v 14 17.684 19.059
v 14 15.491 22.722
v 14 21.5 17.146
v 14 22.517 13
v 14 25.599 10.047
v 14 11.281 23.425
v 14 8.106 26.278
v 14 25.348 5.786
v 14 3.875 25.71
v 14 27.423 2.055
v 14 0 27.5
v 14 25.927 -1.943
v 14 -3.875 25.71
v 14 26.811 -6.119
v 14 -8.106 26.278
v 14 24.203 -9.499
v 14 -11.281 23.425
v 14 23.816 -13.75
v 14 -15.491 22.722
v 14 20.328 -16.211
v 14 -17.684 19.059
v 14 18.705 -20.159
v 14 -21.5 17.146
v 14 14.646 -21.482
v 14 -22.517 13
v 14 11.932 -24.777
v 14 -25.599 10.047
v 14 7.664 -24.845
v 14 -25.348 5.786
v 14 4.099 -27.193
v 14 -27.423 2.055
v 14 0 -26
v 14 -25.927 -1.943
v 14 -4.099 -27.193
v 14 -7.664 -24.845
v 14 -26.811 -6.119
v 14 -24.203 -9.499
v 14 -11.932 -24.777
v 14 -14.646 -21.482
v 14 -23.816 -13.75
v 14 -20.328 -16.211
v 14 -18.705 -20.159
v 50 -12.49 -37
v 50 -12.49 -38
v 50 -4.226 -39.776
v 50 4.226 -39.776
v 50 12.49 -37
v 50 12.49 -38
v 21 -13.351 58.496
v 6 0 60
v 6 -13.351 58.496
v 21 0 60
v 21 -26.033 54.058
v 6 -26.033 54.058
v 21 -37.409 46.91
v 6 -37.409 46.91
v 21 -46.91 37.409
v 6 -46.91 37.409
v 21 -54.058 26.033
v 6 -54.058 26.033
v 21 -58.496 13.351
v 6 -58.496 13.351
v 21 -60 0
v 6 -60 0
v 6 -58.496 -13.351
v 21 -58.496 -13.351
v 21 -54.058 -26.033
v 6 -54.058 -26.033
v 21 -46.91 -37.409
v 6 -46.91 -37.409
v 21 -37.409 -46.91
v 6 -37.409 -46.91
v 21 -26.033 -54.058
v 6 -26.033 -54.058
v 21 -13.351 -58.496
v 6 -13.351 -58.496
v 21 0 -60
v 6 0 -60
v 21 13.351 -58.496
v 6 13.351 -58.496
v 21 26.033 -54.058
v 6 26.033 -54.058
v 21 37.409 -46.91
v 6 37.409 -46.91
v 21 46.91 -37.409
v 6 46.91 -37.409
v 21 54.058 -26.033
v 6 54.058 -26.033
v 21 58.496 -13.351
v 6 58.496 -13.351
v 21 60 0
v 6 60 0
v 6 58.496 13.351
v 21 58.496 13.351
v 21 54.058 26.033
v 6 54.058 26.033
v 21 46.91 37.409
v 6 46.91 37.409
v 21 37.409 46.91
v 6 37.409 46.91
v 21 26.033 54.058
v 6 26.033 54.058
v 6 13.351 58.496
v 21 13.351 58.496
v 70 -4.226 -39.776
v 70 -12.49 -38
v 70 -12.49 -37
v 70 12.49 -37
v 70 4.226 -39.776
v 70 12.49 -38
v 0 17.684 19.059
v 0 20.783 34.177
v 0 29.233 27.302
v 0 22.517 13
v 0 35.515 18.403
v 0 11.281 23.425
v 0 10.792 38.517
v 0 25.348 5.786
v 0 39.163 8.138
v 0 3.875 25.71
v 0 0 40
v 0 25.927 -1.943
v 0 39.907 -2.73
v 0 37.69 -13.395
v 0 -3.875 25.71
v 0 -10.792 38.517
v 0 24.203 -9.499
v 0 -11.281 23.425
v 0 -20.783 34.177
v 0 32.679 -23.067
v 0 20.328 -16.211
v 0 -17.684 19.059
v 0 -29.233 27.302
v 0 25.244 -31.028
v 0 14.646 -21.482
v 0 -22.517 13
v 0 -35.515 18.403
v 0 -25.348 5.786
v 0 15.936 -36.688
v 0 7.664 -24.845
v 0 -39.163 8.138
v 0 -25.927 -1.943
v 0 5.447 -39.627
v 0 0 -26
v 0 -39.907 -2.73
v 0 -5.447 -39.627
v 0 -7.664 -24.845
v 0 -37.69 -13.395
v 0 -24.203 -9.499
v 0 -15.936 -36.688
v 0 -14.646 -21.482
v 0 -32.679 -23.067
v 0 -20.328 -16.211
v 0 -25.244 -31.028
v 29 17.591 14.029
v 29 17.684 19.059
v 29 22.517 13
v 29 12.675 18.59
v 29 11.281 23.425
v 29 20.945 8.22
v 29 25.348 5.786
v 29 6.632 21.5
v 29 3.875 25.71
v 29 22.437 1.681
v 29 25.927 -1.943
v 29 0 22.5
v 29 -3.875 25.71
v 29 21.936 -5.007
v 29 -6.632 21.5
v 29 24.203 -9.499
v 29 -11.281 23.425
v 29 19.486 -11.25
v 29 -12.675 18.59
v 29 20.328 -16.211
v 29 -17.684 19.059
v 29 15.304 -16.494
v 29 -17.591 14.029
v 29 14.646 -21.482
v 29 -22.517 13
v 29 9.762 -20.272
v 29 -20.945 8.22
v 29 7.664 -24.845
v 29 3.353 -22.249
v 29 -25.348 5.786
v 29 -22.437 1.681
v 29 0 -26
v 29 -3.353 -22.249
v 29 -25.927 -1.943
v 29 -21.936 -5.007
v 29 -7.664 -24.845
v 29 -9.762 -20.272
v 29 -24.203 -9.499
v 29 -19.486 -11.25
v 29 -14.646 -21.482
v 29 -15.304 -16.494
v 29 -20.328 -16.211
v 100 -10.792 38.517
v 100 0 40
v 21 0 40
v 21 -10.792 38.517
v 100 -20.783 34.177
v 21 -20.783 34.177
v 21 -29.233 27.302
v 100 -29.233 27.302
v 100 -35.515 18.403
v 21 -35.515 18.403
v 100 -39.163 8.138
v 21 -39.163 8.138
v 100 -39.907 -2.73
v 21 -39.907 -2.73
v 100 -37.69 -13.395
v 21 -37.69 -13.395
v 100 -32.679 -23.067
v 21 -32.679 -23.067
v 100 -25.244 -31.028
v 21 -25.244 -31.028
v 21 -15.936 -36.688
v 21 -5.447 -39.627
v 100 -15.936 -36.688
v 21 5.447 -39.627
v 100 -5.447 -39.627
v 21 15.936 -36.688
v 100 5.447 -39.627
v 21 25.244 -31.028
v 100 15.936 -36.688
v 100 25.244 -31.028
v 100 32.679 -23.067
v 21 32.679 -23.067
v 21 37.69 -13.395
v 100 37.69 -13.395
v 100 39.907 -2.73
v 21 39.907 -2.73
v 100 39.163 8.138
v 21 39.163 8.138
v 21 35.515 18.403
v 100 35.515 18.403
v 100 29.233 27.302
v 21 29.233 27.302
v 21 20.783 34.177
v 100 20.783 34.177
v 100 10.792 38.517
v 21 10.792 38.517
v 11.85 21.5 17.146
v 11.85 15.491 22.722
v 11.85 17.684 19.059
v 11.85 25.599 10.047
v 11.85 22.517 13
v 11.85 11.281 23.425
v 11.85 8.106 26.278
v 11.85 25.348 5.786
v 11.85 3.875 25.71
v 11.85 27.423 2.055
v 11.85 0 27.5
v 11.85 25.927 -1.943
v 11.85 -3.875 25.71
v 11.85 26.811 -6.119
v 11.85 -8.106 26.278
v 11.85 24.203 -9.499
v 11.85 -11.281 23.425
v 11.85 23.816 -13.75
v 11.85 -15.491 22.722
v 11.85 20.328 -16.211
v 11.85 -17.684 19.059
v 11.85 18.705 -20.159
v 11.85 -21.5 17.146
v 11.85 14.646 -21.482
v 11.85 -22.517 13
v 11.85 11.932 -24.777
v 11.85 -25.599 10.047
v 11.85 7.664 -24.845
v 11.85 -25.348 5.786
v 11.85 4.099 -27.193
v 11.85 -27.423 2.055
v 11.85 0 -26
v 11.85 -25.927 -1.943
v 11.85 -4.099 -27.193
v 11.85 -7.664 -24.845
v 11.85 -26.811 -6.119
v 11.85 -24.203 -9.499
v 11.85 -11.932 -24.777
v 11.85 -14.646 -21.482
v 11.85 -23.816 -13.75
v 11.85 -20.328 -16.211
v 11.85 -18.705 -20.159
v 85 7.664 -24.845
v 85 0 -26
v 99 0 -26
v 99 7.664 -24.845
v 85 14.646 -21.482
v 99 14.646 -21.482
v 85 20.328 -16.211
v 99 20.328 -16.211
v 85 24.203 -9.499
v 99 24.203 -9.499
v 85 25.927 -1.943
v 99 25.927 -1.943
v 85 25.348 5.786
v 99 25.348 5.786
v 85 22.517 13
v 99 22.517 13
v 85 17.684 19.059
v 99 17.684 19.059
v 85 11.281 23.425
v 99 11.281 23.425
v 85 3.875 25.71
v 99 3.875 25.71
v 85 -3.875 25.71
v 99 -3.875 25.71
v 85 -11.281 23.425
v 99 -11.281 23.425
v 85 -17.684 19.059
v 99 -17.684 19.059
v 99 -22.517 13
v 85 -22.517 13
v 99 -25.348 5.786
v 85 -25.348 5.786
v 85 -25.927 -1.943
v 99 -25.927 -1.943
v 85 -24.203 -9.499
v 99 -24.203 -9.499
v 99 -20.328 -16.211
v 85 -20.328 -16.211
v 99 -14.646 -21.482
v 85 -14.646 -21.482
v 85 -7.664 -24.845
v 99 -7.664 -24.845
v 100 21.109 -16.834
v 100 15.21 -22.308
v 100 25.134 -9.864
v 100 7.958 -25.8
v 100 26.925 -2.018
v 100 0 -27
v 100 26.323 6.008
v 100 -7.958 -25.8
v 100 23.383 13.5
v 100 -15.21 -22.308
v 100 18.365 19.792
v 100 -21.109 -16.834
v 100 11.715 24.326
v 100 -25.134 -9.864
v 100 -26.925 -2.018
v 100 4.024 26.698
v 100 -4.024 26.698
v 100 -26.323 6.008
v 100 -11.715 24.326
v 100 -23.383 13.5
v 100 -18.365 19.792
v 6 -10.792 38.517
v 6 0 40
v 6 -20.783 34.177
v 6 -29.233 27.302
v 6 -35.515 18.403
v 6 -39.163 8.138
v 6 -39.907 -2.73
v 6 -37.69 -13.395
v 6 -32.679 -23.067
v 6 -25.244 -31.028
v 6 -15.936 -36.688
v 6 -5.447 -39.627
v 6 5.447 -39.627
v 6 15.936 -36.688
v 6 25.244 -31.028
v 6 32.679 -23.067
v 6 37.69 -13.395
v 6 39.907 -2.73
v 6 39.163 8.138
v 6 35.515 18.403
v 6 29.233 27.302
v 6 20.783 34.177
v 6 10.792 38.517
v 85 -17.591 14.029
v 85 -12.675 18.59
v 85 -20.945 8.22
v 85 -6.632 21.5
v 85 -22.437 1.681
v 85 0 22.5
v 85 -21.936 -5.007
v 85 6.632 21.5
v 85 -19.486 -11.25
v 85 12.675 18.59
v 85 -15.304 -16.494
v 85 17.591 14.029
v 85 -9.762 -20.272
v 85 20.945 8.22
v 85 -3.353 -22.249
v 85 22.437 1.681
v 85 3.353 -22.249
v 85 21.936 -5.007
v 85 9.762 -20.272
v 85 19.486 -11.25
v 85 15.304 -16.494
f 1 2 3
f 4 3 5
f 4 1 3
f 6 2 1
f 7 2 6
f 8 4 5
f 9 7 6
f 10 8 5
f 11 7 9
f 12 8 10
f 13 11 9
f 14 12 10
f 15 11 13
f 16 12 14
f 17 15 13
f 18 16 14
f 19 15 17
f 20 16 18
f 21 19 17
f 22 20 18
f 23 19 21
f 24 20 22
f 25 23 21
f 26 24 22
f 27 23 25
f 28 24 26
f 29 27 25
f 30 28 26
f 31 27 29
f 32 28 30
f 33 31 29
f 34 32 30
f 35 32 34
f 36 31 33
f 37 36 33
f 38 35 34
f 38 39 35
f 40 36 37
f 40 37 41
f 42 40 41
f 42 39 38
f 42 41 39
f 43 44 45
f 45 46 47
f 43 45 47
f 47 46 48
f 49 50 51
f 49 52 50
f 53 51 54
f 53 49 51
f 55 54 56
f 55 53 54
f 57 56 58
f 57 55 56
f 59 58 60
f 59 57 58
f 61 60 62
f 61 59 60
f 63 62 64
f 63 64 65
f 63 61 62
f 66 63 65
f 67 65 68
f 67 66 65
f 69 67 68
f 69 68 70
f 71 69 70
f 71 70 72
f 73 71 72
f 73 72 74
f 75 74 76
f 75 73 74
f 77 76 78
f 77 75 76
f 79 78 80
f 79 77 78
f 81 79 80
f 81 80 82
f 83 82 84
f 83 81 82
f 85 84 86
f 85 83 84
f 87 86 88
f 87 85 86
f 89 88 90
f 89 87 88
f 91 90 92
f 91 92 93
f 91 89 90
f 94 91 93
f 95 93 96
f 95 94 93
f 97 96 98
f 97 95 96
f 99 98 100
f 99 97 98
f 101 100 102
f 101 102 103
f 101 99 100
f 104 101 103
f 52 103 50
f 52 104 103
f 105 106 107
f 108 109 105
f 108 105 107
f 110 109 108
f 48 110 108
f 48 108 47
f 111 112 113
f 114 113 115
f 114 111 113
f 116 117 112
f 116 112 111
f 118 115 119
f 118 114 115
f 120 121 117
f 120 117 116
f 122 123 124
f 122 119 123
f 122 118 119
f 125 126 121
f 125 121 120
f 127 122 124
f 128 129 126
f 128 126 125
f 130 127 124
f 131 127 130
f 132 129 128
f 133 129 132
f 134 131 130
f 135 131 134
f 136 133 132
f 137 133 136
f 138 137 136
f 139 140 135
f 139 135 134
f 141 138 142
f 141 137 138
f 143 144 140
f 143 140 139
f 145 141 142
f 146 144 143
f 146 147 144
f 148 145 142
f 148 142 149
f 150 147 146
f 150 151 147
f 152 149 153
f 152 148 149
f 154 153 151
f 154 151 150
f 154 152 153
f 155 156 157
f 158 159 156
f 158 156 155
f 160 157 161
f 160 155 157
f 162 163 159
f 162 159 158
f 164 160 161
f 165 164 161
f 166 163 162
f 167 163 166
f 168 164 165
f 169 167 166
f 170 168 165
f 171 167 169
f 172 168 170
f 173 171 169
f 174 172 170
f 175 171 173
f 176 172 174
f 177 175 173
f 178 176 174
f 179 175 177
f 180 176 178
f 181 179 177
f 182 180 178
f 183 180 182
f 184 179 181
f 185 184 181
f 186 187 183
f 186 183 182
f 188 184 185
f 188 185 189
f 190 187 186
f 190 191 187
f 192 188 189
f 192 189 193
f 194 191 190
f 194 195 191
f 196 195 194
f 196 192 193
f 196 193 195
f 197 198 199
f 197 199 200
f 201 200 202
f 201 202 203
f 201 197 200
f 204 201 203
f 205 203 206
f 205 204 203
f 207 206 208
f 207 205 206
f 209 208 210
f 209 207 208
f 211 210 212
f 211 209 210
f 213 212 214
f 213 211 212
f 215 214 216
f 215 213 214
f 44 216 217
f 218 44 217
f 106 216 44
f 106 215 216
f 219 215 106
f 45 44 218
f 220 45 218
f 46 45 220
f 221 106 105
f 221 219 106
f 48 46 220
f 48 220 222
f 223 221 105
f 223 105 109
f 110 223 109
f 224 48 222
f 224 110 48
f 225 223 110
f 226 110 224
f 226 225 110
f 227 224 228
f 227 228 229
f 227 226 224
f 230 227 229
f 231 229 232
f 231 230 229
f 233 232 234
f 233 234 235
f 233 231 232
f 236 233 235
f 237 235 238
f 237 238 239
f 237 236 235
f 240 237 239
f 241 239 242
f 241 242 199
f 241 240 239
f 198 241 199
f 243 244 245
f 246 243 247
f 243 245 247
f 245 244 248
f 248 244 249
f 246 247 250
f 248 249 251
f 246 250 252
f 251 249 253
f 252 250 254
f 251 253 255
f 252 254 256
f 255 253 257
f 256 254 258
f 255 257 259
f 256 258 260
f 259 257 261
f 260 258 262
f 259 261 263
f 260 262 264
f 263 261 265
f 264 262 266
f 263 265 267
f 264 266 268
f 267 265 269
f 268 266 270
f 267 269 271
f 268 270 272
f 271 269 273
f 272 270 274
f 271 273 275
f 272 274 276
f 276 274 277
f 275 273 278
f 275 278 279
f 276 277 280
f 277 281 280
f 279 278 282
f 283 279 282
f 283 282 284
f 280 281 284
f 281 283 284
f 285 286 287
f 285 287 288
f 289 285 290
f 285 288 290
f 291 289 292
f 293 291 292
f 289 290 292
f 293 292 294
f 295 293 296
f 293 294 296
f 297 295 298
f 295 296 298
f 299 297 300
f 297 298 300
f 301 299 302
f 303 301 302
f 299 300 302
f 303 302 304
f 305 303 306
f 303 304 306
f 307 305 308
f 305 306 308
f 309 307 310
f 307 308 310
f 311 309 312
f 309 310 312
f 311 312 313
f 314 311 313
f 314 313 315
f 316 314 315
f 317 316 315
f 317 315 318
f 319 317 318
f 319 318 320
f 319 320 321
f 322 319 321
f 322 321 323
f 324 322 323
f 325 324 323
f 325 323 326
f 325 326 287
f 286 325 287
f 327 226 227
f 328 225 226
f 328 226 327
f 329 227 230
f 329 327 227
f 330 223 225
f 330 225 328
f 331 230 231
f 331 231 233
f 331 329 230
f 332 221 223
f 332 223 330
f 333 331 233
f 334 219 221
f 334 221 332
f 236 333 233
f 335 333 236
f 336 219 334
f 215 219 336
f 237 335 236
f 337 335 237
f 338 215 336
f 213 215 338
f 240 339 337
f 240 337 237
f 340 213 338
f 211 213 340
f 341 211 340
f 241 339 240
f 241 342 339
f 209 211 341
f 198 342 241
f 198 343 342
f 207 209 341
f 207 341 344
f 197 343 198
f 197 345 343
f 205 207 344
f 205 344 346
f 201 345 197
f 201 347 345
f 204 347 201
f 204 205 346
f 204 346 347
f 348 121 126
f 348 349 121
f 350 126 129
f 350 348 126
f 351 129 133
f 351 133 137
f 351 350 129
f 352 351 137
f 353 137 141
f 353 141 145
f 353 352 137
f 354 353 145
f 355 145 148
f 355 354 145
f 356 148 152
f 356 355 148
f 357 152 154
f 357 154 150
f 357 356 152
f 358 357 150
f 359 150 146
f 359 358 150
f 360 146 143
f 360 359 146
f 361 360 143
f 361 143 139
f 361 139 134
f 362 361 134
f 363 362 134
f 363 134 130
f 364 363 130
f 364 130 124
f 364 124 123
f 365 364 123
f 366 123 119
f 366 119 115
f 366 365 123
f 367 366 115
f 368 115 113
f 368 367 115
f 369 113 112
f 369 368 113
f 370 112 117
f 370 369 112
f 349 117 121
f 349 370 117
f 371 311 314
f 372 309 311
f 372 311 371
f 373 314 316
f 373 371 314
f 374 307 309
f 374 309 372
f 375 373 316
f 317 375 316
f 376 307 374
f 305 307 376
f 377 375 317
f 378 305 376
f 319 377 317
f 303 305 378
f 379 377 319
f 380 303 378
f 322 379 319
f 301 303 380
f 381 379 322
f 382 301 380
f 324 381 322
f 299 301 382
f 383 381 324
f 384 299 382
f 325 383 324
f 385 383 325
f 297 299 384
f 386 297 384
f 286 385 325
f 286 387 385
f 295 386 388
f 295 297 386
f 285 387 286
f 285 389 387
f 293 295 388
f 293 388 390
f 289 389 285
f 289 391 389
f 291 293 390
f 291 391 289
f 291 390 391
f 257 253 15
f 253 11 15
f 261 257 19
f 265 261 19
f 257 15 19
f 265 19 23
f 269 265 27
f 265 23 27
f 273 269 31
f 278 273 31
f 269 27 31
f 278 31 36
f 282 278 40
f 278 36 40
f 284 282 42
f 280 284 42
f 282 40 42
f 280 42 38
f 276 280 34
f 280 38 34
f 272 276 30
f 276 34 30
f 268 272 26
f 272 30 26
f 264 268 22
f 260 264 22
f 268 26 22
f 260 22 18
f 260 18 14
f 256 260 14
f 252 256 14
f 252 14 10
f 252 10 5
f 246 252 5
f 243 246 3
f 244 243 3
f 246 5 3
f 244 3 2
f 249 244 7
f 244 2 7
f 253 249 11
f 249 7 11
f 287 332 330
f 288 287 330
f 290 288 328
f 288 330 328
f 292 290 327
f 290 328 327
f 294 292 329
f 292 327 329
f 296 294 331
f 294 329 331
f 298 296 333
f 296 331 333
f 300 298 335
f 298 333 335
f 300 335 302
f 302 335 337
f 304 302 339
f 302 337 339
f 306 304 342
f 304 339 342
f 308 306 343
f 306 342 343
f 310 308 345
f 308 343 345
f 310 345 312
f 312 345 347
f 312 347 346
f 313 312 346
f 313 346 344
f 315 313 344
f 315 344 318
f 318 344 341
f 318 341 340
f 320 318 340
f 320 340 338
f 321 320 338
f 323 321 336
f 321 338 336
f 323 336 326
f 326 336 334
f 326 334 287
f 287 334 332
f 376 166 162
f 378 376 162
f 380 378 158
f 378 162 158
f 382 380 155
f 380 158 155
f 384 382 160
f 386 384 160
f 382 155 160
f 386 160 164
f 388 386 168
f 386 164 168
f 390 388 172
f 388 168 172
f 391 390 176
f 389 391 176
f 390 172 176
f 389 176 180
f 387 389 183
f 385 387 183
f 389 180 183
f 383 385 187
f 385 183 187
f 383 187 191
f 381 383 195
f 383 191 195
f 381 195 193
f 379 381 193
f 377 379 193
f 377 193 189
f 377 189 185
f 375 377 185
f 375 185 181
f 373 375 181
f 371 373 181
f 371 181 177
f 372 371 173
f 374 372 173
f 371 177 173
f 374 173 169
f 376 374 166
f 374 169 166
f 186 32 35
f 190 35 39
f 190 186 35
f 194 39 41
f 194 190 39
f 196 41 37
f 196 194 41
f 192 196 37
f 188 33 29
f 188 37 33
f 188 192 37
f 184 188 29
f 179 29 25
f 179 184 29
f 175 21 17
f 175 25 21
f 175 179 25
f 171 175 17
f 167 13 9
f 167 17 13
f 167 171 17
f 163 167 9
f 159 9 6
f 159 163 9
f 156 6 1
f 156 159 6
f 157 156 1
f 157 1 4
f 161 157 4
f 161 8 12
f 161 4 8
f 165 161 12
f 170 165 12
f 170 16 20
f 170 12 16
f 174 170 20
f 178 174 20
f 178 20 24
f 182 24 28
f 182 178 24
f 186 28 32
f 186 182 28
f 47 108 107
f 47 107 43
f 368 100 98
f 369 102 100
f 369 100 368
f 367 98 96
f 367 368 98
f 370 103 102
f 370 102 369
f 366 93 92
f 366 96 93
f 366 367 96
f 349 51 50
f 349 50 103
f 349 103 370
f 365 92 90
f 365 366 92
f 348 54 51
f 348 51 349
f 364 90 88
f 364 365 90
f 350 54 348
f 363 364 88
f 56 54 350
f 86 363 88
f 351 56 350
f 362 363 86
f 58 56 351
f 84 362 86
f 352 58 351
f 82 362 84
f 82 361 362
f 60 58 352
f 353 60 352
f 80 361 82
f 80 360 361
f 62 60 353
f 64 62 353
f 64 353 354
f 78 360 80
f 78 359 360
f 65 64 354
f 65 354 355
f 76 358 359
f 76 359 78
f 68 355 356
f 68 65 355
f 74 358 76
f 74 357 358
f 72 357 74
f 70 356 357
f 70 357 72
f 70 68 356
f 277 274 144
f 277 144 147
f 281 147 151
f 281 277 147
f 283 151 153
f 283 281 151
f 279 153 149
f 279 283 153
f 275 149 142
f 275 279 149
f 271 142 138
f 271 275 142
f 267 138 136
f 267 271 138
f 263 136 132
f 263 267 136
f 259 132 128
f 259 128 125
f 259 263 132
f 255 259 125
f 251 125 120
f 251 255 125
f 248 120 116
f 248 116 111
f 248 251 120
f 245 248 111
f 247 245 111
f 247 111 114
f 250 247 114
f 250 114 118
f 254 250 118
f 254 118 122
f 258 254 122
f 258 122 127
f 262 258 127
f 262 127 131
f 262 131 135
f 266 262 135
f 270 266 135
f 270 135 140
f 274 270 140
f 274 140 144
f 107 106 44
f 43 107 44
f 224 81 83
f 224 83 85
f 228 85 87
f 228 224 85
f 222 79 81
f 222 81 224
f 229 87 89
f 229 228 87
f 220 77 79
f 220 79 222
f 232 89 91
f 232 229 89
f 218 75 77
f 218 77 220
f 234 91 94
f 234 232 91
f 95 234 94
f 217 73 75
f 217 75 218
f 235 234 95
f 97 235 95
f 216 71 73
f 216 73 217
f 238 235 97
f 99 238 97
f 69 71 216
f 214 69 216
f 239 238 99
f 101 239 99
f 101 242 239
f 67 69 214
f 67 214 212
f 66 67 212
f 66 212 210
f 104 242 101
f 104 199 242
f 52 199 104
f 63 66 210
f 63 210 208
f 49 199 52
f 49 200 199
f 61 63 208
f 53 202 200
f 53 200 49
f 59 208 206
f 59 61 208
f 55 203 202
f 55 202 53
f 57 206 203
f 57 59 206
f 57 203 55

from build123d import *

# Parameters (mm, degrees)
SKETCH2_W                                           = 20
SKETCH2_H                                           = 24.98
CUT_EXTRUDE1_DEPTH                                  = 3
CBORE_FOR_M5_HEX_SOCKET_HEAD_CAP_SCREW1_D           = 45
CBORE_FOR_M5_HEX_SOCKET_HEAD_CAP_SCREW1_CBORE_D     = 52
CBORE_FOR_M5_HEX_SOCKET_HEAD_CAP_SCREW1_CBORE_DEPTH = 15
CHAMFER1_SIZE                                       = 1
CUT_EXTRUDE2_START                                  = -29
SKETCH15_R                                          = 26
CUT_EXTRUDE2_DEPTH                                  = 29
SKETCH16_W                                          = 2.15
SKETCH16_H                                          = 27.5


with BuildPart() as part:
    # Sketch1 → Revolve1 (revolve)
    with BuildSketch(Plane.XY, mode=Mode.PRIVATE) as revolve1_sk:
        Polygon((0, 0), (0, 40), (6, 40), (6, 60), (21, 60), (21, 40), (100, 40), (100, 0), align=None)
    revolve(revolve1_sk.sketch.rotate(Axis((0, 0, 0), (1, 0, 0)), 90), axis=Axis((0, 0, 0), (1, 0, 0)))

    # Sketch2 → Cut-Extrude1 (cut)
    with BuildSketch(Plane(origin=(0, 0, -40), x_dir=(-1, 0, 0), z_dir=(0, 0, -1))):
        with Locations((-60, 0)):
            Rectangle(SKETCH2_W, SKETCH2_H)
    extrude(amount=-CUT_EXTRUDE1_DEPTH, mode=Mode.SUBTRACT)

    # CBORE for M5 Hex Socket Head Cap Screw1 (through all)
    with Locations(Plane(origin=(100, 0, 0), x_dir=(0, 0, -1), z_dir=(1, 0, 0))):
        with Locations((0, 0)):
            CounterBoreHole(CBORE_FOR_M5_HEX_SOCKET_HEAD_CAP_SCREW1_D / 2, CBORE_FOR_M5_HEX_SOCKET_HEAD_CAP_SCREW1_CBORE_D / 2, CBORE_FOR_M5_HEX_SOCKET_HEAD_CAP_SCREW1_CBORE_DEPTH)

    # Chamfer1
    chamfer1_edges = [part.edges().sort_by_distance(p)[0] for p in [
        (100, 0, 26),
    ]]
    chamfer(chamfer1_edges, length=CHAMFER1_SIZE)

    # Sketch15 → Cut-Extrude2 (cut)
    with BuildSketch(Plane.ZY.offset(CUT_EXTRUDE2_START)):
        with Locations(Location((0, 0, 0), (0, 0, 180))):
            Circle(SKETCH15_R)
    extrude(amount=CUT_EXTRUDE2_DEPTH, mode=Mode.SUBTRACT)

    # Sketch16 → Cut-Revolve1 (revolve, cut)
    with BuildSketch(Plane.XY, mode=Mode.PRIVATE) as cut_revolve1_sk:
        with Locations((12.925, 13.75)):
            Rectangle(SKETCH16_W, SKETCH16_H)
    revolve(cut_revolve1_sk.sketch.rotate(Axis((0, 0, 0), (1, 0, 0)), 90), axis=Axis((0, 0, 0), (1, 0, 0)), mode=Mode.SUBTRACT)


solid = part.part
